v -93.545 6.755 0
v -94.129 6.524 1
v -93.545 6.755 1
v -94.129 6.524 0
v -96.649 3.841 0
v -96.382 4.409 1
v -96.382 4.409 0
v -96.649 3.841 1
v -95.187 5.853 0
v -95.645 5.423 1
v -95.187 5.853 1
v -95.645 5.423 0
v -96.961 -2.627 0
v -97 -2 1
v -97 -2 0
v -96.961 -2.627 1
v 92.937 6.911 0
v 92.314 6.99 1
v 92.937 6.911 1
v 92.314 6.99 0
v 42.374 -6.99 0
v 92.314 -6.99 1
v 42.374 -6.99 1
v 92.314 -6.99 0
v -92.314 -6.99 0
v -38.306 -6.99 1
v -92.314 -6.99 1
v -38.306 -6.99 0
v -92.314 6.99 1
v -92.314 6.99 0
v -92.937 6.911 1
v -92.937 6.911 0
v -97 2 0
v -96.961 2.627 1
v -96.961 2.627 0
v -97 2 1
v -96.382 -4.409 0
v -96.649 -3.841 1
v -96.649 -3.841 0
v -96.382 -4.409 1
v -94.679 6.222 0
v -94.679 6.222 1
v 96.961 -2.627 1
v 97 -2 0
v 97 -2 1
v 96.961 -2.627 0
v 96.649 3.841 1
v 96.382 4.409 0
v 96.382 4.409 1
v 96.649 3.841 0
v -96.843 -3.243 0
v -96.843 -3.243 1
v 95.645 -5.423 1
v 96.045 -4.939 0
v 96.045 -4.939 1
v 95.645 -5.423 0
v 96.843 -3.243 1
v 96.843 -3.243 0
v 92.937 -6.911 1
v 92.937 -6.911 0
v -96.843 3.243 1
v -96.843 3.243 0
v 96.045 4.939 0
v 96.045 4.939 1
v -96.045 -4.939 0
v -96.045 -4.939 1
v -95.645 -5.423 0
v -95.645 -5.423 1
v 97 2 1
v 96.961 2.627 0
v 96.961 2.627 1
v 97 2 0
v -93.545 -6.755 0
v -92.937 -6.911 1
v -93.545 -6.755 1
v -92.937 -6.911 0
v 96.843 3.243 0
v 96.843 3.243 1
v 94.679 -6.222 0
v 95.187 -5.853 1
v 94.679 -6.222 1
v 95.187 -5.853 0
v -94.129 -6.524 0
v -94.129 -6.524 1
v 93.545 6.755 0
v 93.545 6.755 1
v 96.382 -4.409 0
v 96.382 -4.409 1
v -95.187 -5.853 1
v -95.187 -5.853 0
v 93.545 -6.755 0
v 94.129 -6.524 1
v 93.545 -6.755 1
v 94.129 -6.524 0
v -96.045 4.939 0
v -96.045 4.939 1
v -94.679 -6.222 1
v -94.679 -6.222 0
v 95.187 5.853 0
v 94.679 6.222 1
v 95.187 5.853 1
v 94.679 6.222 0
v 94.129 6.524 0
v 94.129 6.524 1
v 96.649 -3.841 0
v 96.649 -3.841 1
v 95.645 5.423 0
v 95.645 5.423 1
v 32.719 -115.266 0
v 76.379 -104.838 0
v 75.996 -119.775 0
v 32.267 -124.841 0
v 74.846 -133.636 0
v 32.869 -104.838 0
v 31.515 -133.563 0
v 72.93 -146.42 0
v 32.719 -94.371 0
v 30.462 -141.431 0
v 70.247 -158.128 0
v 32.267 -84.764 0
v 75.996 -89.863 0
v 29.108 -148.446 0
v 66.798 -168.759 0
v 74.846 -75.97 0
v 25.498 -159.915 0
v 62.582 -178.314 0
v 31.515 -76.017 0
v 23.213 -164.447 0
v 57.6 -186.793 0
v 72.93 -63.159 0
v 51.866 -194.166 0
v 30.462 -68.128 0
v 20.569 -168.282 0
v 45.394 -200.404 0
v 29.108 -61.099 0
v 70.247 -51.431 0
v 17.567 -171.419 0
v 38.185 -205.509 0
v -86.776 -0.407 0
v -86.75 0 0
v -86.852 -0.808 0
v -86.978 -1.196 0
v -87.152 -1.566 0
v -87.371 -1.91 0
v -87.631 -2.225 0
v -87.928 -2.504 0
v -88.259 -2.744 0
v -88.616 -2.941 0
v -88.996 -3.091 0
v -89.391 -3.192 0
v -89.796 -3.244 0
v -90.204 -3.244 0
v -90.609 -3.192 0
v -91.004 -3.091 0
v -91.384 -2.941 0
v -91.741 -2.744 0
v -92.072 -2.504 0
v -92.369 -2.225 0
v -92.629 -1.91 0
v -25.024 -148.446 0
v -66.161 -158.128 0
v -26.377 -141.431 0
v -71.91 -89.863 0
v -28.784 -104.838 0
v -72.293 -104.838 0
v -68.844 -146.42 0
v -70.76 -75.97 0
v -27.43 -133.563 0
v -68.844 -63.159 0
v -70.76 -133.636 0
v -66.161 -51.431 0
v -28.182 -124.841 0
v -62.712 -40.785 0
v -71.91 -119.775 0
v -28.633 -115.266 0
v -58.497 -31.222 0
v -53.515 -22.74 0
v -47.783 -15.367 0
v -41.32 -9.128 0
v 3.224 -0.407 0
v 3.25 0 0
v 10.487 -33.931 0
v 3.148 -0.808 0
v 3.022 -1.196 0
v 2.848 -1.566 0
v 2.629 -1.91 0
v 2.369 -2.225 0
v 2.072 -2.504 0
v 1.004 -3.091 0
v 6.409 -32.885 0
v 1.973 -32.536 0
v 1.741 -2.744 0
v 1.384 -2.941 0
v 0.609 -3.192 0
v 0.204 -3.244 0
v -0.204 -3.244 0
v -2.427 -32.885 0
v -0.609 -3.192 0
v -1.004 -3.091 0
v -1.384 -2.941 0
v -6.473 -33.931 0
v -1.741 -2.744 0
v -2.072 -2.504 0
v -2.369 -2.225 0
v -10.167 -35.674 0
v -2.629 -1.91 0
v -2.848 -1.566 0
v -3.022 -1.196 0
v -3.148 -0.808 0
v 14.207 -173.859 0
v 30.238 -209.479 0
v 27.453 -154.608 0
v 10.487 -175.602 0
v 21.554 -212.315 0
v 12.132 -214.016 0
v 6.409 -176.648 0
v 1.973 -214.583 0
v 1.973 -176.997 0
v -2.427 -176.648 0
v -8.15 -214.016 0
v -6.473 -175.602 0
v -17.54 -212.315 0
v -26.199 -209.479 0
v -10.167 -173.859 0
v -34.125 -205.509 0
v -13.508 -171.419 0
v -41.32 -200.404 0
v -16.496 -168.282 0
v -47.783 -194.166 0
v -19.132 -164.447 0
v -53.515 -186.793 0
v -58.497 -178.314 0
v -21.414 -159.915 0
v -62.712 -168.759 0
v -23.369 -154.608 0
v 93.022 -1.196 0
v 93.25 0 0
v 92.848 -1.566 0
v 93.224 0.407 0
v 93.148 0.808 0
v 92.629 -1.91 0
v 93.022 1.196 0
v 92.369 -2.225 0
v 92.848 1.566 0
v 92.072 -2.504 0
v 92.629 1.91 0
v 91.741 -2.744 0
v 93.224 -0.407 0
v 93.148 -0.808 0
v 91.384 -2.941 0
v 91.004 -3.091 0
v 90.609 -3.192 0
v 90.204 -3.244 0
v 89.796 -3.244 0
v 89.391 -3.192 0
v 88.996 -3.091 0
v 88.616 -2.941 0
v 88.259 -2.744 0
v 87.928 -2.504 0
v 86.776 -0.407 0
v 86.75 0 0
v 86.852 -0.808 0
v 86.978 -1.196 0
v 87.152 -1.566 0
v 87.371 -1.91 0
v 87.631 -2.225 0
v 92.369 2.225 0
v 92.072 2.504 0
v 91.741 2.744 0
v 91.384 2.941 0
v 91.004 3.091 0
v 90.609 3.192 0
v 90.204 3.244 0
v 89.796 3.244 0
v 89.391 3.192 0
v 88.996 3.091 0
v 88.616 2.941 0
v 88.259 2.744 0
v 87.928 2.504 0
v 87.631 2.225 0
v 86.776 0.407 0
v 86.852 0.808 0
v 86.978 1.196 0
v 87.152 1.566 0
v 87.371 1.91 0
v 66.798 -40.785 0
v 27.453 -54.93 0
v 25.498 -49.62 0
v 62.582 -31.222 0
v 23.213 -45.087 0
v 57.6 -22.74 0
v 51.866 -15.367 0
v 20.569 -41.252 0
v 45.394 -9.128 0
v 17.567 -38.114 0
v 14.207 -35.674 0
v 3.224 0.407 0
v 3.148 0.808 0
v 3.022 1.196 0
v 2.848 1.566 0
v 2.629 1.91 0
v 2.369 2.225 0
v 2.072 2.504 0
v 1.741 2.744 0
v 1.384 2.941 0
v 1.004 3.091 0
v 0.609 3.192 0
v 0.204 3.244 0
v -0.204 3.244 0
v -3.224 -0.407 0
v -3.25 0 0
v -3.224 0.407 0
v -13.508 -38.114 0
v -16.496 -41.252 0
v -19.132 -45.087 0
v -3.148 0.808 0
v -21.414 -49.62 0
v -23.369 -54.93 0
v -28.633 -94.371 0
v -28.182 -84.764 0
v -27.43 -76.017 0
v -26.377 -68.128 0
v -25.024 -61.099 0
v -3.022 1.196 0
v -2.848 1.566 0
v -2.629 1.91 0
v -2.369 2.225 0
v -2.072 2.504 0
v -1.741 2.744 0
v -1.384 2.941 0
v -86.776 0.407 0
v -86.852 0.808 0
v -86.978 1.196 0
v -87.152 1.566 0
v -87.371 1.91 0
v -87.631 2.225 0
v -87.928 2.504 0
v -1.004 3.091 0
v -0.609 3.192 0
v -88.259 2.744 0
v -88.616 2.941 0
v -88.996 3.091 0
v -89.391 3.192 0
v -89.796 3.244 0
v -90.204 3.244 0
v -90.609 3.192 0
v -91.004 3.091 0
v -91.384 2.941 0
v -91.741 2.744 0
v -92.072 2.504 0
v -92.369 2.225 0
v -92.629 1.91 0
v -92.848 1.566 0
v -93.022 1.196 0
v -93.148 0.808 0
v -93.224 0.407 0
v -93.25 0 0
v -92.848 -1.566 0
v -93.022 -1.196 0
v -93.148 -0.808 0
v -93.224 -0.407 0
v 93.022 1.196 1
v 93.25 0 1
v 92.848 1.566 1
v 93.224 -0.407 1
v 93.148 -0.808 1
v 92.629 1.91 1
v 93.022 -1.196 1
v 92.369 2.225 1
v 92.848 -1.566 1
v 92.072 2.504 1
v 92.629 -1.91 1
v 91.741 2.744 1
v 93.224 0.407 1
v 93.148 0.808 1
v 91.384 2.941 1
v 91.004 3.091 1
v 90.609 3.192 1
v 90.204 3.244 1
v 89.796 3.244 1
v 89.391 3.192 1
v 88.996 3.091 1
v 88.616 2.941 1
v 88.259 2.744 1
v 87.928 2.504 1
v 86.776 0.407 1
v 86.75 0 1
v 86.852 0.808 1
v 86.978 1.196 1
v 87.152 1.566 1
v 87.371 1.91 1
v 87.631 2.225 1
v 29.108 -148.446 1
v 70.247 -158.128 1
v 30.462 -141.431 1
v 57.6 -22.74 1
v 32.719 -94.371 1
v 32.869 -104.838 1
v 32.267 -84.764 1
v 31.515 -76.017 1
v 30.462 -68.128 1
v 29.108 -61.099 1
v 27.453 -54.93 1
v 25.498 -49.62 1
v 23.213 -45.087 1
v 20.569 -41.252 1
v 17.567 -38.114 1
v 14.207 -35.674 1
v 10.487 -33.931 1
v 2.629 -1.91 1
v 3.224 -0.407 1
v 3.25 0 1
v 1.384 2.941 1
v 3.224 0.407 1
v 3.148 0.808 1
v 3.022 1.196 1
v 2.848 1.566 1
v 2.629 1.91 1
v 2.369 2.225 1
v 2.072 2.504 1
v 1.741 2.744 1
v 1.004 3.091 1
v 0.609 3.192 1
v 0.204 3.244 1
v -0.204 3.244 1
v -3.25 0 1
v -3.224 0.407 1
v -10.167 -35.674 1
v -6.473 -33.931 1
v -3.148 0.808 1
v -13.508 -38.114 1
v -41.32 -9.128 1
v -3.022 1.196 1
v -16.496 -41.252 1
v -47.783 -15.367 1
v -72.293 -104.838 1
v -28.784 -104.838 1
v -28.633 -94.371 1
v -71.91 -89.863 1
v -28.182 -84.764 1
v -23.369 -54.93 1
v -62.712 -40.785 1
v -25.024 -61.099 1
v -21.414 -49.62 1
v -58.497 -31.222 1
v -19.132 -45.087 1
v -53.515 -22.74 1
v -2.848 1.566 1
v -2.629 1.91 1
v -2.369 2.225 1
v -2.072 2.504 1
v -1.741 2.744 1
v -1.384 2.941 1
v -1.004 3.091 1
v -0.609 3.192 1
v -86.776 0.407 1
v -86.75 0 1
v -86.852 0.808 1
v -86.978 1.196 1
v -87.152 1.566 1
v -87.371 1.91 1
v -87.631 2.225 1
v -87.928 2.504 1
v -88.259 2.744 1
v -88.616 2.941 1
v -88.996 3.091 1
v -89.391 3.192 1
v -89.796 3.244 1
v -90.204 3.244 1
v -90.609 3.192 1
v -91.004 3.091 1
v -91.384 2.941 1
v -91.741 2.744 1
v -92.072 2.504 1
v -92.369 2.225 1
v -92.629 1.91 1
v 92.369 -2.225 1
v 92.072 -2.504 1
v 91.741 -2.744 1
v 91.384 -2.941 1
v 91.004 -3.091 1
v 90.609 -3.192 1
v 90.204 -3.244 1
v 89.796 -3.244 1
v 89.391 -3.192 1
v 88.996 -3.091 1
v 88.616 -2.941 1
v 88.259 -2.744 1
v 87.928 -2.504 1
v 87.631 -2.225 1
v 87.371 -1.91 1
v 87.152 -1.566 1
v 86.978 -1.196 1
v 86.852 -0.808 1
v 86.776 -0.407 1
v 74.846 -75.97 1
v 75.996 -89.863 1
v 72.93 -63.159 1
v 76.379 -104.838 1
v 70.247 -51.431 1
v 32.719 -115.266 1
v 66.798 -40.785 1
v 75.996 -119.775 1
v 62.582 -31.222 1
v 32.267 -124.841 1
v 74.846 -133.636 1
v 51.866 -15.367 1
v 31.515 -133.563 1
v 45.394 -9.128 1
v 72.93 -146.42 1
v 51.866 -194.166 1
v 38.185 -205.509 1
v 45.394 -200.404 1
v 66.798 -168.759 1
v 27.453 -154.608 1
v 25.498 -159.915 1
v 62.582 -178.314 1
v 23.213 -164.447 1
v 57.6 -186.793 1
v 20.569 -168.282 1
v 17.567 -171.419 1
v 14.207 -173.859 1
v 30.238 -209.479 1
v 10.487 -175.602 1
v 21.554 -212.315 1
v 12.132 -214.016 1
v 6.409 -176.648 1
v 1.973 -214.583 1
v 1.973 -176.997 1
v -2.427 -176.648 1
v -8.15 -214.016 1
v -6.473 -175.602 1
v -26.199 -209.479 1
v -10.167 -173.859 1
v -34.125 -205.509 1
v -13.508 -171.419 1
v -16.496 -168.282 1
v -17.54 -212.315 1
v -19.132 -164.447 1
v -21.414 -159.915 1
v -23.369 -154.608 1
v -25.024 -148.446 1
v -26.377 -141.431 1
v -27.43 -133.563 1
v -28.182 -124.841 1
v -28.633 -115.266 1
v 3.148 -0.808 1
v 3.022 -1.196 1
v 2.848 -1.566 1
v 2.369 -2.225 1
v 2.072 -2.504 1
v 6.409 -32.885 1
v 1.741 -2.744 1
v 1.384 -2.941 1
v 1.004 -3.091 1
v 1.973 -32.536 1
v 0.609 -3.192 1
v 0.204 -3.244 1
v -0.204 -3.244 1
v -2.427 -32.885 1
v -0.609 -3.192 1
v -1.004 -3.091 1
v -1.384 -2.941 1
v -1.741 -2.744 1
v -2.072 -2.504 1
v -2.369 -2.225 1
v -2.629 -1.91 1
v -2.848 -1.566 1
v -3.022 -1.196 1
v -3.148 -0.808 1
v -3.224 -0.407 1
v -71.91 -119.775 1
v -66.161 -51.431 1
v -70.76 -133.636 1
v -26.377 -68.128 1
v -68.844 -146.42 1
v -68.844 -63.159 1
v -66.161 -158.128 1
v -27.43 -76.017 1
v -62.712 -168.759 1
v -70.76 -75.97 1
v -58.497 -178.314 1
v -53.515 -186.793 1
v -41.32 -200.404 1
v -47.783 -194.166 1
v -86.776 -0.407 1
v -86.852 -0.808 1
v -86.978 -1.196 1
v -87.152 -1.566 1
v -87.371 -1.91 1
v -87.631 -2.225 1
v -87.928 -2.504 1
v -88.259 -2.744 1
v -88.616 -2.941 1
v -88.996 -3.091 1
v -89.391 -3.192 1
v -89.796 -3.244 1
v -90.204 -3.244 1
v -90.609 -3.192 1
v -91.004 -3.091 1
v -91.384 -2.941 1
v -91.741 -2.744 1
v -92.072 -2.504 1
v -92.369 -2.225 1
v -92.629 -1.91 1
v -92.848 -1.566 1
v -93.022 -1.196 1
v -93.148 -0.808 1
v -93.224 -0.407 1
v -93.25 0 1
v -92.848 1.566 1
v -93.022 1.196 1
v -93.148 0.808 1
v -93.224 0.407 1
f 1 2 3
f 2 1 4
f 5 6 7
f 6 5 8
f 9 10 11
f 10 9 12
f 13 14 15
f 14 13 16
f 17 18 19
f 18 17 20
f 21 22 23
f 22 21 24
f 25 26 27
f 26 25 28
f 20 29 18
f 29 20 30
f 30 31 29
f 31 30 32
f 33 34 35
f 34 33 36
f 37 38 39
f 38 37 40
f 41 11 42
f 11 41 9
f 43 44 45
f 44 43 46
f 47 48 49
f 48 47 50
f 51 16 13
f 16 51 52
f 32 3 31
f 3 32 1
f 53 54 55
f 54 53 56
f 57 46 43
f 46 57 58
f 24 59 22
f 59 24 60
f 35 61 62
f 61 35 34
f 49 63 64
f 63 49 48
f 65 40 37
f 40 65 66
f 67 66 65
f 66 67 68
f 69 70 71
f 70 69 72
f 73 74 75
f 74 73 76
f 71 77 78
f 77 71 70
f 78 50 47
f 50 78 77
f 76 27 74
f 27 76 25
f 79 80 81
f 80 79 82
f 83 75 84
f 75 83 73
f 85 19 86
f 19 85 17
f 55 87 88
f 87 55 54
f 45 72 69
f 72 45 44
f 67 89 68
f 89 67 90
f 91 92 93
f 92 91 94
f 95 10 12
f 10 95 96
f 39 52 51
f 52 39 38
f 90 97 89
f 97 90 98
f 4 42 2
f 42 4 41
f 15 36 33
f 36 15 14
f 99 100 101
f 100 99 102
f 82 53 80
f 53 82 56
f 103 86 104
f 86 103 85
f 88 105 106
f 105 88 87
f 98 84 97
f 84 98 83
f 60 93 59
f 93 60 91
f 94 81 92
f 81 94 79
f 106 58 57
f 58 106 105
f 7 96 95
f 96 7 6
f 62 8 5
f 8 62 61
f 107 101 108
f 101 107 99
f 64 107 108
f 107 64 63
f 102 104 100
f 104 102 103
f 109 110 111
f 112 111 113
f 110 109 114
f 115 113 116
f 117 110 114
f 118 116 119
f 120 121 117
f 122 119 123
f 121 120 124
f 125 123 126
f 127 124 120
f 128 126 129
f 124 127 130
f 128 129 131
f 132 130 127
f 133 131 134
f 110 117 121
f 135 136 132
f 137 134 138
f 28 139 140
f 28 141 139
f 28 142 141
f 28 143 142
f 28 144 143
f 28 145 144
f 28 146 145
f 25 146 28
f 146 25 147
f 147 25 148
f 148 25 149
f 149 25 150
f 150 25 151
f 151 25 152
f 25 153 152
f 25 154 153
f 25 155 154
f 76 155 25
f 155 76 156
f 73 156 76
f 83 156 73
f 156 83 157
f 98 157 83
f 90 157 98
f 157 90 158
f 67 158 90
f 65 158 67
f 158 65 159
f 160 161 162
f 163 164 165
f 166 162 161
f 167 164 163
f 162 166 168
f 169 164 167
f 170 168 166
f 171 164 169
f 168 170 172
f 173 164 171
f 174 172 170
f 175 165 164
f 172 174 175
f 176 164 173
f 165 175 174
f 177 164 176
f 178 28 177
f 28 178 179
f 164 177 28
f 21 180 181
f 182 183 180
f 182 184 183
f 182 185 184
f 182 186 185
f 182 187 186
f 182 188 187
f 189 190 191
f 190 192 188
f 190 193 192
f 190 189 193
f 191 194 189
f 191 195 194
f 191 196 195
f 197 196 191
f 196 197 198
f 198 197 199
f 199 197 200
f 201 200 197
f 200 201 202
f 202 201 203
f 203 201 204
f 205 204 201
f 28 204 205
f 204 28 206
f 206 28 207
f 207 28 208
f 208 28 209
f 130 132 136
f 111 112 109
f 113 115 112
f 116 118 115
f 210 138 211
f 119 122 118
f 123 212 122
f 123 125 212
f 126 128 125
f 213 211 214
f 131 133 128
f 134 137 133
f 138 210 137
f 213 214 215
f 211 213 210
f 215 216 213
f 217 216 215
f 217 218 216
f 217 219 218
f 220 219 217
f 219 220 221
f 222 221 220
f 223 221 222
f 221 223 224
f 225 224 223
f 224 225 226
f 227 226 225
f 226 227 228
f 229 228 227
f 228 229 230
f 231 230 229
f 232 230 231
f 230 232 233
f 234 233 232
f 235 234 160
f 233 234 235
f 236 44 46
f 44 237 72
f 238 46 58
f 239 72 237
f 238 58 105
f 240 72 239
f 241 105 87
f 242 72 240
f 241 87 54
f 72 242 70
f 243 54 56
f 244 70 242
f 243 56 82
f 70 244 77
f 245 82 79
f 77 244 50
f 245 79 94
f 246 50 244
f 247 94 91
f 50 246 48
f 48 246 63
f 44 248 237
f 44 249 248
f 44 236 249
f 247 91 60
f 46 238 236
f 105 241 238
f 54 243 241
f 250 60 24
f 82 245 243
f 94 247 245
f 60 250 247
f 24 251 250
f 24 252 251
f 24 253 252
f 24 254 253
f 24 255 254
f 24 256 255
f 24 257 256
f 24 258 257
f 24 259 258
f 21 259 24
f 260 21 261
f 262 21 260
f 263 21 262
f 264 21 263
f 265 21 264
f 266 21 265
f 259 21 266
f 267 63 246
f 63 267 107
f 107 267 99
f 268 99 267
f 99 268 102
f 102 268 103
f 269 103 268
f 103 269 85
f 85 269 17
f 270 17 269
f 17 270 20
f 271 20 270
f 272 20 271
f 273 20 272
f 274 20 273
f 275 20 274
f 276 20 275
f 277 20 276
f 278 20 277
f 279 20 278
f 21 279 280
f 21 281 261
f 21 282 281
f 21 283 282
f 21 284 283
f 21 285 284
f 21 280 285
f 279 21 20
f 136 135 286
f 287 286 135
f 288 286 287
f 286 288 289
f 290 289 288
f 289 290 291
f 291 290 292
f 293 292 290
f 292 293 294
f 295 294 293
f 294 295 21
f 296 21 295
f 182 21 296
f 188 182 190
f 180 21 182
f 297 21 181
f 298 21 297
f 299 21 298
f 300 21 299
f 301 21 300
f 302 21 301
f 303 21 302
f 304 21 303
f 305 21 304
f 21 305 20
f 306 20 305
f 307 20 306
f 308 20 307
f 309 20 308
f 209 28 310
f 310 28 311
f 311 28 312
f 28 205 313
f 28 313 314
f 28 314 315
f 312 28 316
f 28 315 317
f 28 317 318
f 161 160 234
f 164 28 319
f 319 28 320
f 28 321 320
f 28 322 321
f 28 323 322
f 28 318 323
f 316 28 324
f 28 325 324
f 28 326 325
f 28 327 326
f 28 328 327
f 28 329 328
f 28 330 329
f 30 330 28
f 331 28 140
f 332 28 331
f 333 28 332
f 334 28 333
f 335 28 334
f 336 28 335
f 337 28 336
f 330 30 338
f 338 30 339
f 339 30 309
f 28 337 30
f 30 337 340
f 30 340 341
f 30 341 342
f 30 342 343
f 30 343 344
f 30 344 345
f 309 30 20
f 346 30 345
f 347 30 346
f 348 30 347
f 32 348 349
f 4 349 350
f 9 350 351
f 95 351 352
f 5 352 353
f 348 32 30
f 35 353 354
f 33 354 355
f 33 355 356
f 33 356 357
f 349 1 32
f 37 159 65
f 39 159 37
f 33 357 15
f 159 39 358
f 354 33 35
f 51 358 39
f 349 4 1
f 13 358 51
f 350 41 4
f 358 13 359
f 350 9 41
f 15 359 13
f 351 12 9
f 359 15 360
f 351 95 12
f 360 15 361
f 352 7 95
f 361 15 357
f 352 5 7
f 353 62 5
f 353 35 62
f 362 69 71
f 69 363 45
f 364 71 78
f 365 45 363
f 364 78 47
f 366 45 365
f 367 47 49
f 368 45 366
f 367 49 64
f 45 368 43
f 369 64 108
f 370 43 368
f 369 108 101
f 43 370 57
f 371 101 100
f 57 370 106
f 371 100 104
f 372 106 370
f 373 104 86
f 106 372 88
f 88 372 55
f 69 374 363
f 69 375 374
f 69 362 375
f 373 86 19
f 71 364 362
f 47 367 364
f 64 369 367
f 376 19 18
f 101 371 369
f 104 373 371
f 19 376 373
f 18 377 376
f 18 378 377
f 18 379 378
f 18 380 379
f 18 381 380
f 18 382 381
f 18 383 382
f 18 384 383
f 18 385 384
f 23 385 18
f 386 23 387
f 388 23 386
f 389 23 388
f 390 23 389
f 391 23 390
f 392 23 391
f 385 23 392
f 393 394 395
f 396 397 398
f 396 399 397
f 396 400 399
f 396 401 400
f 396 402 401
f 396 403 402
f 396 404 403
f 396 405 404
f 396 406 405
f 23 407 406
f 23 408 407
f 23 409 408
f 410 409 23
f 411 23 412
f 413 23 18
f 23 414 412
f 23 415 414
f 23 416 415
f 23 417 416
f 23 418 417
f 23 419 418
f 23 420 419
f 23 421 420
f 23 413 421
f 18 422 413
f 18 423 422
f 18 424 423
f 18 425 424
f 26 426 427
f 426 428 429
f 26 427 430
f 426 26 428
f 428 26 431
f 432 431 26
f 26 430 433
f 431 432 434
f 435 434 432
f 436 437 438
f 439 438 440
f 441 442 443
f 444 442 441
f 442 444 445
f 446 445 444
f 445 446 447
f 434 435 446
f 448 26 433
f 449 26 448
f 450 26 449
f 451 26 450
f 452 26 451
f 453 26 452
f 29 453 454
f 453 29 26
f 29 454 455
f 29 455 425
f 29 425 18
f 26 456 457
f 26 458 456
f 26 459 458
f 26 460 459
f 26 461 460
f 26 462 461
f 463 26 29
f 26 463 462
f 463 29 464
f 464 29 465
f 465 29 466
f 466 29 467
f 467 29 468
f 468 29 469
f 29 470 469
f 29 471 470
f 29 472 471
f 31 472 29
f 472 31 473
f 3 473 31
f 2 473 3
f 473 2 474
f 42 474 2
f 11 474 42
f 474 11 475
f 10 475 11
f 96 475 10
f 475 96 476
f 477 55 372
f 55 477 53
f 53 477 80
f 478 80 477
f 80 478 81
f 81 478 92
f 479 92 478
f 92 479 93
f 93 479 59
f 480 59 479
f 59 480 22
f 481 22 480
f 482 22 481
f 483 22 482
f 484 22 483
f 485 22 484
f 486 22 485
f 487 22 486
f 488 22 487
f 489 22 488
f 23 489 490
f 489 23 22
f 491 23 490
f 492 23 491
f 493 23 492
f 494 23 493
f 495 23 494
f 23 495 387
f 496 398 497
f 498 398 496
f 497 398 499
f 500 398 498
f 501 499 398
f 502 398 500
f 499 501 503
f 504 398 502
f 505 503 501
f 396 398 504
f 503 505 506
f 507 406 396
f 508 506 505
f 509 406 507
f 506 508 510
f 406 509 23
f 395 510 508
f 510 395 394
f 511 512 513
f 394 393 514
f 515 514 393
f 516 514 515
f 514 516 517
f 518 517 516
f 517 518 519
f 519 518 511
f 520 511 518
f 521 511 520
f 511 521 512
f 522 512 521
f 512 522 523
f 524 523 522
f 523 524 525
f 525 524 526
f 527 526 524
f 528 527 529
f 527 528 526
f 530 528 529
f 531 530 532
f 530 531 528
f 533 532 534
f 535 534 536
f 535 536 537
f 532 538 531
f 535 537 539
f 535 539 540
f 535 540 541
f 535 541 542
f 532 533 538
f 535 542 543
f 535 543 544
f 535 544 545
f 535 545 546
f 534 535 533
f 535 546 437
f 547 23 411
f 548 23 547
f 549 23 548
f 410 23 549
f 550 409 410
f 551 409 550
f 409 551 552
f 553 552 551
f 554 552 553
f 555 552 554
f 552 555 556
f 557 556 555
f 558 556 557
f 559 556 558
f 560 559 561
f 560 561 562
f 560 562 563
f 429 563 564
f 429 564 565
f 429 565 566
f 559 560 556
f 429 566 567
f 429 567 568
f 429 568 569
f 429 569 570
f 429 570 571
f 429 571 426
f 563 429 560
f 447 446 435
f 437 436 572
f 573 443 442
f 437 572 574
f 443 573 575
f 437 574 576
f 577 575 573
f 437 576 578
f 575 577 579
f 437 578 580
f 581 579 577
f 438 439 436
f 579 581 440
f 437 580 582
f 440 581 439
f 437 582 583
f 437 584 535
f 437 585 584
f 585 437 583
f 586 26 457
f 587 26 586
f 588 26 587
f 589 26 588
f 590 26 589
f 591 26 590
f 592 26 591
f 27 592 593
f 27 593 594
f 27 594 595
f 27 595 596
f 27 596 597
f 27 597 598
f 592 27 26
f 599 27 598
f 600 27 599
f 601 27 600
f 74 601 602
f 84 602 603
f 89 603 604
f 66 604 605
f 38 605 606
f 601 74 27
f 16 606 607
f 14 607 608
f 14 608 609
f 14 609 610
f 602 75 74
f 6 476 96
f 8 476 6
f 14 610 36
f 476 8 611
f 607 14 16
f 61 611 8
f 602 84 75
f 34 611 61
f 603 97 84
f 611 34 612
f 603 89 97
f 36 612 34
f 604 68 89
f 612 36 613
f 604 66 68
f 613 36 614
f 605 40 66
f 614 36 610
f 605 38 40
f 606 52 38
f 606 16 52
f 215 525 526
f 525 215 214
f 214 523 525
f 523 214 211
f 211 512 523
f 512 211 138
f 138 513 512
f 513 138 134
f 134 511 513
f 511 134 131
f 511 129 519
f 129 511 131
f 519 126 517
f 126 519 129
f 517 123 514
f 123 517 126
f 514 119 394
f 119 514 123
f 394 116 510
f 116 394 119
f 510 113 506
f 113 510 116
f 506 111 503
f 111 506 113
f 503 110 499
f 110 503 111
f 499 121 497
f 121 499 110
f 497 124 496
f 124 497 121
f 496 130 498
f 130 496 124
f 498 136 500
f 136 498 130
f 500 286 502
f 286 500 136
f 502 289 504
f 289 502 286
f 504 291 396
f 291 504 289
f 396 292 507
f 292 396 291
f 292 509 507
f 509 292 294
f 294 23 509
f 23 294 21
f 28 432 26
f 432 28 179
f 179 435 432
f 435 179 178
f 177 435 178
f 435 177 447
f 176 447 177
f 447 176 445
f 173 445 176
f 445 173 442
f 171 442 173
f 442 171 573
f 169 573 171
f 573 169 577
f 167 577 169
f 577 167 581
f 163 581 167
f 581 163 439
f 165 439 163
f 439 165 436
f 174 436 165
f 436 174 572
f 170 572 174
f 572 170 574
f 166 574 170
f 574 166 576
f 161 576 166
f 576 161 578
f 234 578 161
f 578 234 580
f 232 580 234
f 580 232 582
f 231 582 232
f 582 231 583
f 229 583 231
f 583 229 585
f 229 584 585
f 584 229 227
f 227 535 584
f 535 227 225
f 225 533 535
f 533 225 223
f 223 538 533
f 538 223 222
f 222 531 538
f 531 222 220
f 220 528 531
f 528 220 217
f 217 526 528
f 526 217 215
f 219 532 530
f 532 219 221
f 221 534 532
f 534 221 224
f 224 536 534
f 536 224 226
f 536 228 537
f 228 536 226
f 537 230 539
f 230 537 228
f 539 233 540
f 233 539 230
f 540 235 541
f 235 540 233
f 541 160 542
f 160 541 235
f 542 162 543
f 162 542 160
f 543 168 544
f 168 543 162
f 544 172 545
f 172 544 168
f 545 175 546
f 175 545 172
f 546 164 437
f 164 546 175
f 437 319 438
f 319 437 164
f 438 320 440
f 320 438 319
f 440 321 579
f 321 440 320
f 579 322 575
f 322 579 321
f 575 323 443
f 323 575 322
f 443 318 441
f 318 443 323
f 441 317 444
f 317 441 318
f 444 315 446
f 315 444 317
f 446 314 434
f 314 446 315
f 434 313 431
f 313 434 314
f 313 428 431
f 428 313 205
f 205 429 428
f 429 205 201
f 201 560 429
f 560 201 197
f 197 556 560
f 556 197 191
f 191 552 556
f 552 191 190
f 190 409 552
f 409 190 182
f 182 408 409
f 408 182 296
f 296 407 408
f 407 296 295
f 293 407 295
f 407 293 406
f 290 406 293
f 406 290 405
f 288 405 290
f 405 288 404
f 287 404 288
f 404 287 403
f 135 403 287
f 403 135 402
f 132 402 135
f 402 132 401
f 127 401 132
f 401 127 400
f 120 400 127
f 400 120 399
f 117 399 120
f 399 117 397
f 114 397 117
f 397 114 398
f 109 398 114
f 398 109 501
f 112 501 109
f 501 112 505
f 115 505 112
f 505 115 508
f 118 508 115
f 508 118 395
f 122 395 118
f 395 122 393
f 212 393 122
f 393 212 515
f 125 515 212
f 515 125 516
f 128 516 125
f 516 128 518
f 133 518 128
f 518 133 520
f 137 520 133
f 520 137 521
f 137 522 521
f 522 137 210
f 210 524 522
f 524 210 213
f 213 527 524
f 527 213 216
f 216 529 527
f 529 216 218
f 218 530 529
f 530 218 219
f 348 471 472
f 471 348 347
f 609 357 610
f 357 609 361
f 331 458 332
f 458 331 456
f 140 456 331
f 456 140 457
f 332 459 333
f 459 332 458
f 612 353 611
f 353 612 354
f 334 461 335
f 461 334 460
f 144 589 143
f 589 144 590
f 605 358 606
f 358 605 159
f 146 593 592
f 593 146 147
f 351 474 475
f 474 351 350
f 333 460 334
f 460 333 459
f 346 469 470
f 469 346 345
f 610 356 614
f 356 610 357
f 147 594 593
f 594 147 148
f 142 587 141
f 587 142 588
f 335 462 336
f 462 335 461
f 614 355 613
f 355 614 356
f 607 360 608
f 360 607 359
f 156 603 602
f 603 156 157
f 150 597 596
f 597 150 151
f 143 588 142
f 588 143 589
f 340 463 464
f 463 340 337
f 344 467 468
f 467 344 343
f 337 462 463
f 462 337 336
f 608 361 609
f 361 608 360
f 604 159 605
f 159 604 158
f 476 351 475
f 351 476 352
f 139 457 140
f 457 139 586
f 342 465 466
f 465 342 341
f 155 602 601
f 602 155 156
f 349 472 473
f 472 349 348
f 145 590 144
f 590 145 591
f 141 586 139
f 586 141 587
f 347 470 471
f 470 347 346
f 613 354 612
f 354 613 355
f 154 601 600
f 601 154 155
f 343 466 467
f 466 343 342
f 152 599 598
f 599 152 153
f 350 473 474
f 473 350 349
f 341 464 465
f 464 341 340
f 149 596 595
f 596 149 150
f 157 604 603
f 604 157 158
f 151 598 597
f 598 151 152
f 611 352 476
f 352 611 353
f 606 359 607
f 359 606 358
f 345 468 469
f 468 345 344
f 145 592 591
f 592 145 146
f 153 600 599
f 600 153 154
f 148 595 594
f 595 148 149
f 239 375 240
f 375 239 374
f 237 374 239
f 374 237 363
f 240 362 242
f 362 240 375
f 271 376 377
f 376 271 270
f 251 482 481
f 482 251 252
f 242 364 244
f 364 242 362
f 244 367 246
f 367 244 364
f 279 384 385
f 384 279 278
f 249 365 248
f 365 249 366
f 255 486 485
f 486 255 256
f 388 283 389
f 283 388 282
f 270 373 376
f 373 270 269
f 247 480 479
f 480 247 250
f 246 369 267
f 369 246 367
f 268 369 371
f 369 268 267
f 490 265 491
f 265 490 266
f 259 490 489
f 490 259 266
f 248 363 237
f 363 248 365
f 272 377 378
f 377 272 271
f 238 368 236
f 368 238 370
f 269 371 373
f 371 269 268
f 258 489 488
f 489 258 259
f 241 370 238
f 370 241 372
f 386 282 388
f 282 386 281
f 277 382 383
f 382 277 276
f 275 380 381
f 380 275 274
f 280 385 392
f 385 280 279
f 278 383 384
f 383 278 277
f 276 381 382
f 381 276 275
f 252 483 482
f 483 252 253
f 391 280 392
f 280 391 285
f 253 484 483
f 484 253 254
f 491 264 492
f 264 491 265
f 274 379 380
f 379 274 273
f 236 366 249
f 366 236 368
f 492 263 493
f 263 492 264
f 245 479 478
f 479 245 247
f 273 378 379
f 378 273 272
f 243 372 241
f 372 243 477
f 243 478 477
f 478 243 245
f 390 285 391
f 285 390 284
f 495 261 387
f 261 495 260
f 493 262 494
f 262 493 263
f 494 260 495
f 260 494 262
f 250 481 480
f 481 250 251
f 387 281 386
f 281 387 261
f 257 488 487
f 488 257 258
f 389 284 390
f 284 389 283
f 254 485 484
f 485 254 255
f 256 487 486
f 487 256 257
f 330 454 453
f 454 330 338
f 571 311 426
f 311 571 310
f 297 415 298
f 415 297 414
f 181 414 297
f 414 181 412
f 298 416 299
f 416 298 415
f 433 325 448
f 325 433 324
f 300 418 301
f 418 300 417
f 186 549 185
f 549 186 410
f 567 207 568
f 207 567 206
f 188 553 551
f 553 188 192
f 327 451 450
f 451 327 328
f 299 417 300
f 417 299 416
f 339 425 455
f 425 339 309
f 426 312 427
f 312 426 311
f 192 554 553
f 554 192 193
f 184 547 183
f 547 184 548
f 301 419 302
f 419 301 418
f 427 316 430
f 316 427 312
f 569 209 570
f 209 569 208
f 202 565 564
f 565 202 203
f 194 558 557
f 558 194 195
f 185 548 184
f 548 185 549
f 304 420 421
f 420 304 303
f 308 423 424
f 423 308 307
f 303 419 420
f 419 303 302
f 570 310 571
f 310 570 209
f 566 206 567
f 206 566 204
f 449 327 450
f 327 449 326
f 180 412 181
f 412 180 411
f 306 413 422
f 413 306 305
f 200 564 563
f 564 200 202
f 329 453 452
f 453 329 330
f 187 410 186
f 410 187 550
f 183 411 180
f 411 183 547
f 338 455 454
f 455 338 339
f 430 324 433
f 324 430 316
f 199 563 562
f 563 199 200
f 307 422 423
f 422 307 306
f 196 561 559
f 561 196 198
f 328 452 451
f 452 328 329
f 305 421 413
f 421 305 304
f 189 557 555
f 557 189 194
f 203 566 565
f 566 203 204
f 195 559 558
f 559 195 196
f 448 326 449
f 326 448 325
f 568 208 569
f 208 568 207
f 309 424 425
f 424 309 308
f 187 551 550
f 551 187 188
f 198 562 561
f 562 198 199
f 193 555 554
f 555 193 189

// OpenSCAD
$fn = 50;


difference() {
	union() {
		translate(v = [0, 0, 0]) {
			rotate(a = [0, 0, 0]) {
				hull() {
					translate(v = [-92.0000000000, 2.0000000000, 0]) {
						rotate(a = [0, 0, 0]) {
							translate(v = [0, 0, 0]) {
								rotate(a = [0, 0, 0]) {
									cylinder(h = 1, r = 5);
								}
							}
						}
					}
					translate(v = [92.0000000000, 2.0000000000, 0]) {
						rotate(a = [0, 0, 0]) {
							translate(v = [0, 0, 0]) {
								rotate(a = [0, 0, 0]) {
									cylinder(h = 1, r = 5);
								}
							}
						}
					}
					translate(v = [-92.0000000000, -2.0000000000, 0]) {
						rotate(a = [0, 0, 0]) {
							translate(v = [0, 0, 0]) {
								rotate(a = [0, 0, 0]) {
									cylinder(h = 1, r = 5);
								}
							}
						}
					}
					translate(v = [92.0000000000, -2.0000000000, 0]) {
						rotate(a = [0, 0, 0]) {
							translate(v = [0, 0, 0]) {
								rotate(a = [0, 0, 0]) {
									cylinder(h = 1, r = 5);
								}
							}
						}
					}
				}
			}
		}
		translate(v = [0, 0, 0]) {
			rotate(a = [0, 0, 0]) {
				linear_extrude(height = 1) {
					text(font = "DejaVu Sans Mono:style=Bold", halign = "center", size = 209.0000000000, text = "O", valign = "top");
				}
			}
		}
	}
	union() {
		translate(v = [-90.0000000000, 0.0000000000, -125.0000000000]) {
			rotate(a = [0, 0, 0]) {
				cylinder(h = 250, r = 3.2500000000);
			}
		}
		translate(v = [90.0000000000, 0.0000000000, -125.0000000000]) {
			rotate(a = [0, 0, 0]) {
				cylinder(h = 250, r = 3.2500000000);
			}
		}
		translate(v = [90.0000000000, 0.0000000000, -125.0000000000]) {
			rotate(a = [0, 0, 0]) {
				cylinder(h = 250, r = 3.2500000000);
			}
		}
		translate(v = [0, 0, -125.0000000000]) {
			rotate(a = [0, 0, 0]) {
				cylinder(h = 250, r = 3.2500000000);
			}
		}
	}
}
